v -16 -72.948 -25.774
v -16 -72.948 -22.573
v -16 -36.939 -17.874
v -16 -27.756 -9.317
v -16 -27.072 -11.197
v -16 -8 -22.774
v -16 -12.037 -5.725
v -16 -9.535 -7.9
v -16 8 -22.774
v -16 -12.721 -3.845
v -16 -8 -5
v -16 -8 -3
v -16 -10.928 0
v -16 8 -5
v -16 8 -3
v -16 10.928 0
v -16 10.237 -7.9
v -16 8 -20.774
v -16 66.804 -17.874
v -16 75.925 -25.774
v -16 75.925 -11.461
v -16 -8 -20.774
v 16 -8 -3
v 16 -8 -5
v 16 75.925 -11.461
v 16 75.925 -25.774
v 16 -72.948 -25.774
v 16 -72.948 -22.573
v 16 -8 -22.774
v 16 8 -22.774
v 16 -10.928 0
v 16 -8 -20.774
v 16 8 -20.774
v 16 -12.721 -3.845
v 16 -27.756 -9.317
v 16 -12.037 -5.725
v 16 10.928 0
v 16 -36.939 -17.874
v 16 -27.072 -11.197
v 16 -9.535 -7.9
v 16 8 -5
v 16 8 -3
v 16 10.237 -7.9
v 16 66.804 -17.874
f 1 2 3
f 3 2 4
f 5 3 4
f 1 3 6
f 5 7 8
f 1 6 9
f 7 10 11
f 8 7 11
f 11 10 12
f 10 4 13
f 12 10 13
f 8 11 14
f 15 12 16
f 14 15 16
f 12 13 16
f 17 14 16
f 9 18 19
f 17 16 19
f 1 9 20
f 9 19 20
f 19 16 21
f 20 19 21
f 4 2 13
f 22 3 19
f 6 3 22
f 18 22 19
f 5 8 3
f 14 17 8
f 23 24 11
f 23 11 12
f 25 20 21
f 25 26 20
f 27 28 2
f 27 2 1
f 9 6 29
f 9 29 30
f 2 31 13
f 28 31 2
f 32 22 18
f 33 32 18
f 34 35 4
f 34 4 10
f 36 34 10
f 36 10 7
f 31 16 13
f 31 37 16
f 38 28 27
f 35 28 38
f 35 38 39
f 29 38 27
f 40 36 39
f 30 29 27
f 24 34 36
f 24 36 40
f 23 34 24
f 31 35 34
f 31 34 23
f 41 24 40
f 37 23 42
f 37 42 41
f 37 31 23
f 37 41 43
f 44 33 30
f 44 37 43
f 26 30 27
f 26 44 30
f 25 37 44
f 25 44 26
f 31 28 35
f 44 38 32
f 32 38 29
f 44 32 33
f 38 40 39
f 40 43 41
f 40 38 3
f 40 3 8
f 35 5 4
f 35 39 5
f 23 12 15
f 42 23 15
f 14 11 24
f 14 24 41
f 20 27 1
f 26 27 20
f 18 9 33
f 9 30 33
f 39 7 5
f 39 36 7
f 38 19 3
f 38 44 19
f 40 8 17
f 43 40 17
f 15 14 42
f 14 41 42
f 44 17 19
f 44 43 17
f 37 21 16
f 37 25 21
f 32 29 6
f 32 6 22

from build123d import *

# Parameters (mm, degrees)
F0_W     = 16
F0_H     = 2
F1_DEPTH = 16


with BuildPart() as f1:
    # F0 (on Right) → F1 (new body, symmetric)
    with BuildSketch(Plane.YZ):
        Polygon((10.927957, 0), (-10.927957, 0), (-72.94767, -22.573329), (-72.94767, -25.77426), (75.925268, -25.77426), (75.925268, -11.46078), align=None)
        with Locations((0, -21.77426)):
            Rectangle(F0_W, F0_H, mode=Mode.SUBTRACT)
        Polygon((-27.756056, -9.317461), (-12.720974, -3.845138), (-12.378954, -4.784831), (-12.036934, -5.724524), (-27.072016, -11.196846), align=None, mode=Mode.SUBTRACT)
        with Locations((0, -4)):
            Rectangle(F0_W, F0_H, mode=Mode.SUBTRACT)
        Polygon((-36.939022, -17.874259), (-9.534973, -7.900001), (10.236796, -7.900001), (66.803625, -17.874259), align=None, mode=Mode.SUBTRACT)
    extrude(amount=F1_DEPTH, both=True)


solid = f1.part
